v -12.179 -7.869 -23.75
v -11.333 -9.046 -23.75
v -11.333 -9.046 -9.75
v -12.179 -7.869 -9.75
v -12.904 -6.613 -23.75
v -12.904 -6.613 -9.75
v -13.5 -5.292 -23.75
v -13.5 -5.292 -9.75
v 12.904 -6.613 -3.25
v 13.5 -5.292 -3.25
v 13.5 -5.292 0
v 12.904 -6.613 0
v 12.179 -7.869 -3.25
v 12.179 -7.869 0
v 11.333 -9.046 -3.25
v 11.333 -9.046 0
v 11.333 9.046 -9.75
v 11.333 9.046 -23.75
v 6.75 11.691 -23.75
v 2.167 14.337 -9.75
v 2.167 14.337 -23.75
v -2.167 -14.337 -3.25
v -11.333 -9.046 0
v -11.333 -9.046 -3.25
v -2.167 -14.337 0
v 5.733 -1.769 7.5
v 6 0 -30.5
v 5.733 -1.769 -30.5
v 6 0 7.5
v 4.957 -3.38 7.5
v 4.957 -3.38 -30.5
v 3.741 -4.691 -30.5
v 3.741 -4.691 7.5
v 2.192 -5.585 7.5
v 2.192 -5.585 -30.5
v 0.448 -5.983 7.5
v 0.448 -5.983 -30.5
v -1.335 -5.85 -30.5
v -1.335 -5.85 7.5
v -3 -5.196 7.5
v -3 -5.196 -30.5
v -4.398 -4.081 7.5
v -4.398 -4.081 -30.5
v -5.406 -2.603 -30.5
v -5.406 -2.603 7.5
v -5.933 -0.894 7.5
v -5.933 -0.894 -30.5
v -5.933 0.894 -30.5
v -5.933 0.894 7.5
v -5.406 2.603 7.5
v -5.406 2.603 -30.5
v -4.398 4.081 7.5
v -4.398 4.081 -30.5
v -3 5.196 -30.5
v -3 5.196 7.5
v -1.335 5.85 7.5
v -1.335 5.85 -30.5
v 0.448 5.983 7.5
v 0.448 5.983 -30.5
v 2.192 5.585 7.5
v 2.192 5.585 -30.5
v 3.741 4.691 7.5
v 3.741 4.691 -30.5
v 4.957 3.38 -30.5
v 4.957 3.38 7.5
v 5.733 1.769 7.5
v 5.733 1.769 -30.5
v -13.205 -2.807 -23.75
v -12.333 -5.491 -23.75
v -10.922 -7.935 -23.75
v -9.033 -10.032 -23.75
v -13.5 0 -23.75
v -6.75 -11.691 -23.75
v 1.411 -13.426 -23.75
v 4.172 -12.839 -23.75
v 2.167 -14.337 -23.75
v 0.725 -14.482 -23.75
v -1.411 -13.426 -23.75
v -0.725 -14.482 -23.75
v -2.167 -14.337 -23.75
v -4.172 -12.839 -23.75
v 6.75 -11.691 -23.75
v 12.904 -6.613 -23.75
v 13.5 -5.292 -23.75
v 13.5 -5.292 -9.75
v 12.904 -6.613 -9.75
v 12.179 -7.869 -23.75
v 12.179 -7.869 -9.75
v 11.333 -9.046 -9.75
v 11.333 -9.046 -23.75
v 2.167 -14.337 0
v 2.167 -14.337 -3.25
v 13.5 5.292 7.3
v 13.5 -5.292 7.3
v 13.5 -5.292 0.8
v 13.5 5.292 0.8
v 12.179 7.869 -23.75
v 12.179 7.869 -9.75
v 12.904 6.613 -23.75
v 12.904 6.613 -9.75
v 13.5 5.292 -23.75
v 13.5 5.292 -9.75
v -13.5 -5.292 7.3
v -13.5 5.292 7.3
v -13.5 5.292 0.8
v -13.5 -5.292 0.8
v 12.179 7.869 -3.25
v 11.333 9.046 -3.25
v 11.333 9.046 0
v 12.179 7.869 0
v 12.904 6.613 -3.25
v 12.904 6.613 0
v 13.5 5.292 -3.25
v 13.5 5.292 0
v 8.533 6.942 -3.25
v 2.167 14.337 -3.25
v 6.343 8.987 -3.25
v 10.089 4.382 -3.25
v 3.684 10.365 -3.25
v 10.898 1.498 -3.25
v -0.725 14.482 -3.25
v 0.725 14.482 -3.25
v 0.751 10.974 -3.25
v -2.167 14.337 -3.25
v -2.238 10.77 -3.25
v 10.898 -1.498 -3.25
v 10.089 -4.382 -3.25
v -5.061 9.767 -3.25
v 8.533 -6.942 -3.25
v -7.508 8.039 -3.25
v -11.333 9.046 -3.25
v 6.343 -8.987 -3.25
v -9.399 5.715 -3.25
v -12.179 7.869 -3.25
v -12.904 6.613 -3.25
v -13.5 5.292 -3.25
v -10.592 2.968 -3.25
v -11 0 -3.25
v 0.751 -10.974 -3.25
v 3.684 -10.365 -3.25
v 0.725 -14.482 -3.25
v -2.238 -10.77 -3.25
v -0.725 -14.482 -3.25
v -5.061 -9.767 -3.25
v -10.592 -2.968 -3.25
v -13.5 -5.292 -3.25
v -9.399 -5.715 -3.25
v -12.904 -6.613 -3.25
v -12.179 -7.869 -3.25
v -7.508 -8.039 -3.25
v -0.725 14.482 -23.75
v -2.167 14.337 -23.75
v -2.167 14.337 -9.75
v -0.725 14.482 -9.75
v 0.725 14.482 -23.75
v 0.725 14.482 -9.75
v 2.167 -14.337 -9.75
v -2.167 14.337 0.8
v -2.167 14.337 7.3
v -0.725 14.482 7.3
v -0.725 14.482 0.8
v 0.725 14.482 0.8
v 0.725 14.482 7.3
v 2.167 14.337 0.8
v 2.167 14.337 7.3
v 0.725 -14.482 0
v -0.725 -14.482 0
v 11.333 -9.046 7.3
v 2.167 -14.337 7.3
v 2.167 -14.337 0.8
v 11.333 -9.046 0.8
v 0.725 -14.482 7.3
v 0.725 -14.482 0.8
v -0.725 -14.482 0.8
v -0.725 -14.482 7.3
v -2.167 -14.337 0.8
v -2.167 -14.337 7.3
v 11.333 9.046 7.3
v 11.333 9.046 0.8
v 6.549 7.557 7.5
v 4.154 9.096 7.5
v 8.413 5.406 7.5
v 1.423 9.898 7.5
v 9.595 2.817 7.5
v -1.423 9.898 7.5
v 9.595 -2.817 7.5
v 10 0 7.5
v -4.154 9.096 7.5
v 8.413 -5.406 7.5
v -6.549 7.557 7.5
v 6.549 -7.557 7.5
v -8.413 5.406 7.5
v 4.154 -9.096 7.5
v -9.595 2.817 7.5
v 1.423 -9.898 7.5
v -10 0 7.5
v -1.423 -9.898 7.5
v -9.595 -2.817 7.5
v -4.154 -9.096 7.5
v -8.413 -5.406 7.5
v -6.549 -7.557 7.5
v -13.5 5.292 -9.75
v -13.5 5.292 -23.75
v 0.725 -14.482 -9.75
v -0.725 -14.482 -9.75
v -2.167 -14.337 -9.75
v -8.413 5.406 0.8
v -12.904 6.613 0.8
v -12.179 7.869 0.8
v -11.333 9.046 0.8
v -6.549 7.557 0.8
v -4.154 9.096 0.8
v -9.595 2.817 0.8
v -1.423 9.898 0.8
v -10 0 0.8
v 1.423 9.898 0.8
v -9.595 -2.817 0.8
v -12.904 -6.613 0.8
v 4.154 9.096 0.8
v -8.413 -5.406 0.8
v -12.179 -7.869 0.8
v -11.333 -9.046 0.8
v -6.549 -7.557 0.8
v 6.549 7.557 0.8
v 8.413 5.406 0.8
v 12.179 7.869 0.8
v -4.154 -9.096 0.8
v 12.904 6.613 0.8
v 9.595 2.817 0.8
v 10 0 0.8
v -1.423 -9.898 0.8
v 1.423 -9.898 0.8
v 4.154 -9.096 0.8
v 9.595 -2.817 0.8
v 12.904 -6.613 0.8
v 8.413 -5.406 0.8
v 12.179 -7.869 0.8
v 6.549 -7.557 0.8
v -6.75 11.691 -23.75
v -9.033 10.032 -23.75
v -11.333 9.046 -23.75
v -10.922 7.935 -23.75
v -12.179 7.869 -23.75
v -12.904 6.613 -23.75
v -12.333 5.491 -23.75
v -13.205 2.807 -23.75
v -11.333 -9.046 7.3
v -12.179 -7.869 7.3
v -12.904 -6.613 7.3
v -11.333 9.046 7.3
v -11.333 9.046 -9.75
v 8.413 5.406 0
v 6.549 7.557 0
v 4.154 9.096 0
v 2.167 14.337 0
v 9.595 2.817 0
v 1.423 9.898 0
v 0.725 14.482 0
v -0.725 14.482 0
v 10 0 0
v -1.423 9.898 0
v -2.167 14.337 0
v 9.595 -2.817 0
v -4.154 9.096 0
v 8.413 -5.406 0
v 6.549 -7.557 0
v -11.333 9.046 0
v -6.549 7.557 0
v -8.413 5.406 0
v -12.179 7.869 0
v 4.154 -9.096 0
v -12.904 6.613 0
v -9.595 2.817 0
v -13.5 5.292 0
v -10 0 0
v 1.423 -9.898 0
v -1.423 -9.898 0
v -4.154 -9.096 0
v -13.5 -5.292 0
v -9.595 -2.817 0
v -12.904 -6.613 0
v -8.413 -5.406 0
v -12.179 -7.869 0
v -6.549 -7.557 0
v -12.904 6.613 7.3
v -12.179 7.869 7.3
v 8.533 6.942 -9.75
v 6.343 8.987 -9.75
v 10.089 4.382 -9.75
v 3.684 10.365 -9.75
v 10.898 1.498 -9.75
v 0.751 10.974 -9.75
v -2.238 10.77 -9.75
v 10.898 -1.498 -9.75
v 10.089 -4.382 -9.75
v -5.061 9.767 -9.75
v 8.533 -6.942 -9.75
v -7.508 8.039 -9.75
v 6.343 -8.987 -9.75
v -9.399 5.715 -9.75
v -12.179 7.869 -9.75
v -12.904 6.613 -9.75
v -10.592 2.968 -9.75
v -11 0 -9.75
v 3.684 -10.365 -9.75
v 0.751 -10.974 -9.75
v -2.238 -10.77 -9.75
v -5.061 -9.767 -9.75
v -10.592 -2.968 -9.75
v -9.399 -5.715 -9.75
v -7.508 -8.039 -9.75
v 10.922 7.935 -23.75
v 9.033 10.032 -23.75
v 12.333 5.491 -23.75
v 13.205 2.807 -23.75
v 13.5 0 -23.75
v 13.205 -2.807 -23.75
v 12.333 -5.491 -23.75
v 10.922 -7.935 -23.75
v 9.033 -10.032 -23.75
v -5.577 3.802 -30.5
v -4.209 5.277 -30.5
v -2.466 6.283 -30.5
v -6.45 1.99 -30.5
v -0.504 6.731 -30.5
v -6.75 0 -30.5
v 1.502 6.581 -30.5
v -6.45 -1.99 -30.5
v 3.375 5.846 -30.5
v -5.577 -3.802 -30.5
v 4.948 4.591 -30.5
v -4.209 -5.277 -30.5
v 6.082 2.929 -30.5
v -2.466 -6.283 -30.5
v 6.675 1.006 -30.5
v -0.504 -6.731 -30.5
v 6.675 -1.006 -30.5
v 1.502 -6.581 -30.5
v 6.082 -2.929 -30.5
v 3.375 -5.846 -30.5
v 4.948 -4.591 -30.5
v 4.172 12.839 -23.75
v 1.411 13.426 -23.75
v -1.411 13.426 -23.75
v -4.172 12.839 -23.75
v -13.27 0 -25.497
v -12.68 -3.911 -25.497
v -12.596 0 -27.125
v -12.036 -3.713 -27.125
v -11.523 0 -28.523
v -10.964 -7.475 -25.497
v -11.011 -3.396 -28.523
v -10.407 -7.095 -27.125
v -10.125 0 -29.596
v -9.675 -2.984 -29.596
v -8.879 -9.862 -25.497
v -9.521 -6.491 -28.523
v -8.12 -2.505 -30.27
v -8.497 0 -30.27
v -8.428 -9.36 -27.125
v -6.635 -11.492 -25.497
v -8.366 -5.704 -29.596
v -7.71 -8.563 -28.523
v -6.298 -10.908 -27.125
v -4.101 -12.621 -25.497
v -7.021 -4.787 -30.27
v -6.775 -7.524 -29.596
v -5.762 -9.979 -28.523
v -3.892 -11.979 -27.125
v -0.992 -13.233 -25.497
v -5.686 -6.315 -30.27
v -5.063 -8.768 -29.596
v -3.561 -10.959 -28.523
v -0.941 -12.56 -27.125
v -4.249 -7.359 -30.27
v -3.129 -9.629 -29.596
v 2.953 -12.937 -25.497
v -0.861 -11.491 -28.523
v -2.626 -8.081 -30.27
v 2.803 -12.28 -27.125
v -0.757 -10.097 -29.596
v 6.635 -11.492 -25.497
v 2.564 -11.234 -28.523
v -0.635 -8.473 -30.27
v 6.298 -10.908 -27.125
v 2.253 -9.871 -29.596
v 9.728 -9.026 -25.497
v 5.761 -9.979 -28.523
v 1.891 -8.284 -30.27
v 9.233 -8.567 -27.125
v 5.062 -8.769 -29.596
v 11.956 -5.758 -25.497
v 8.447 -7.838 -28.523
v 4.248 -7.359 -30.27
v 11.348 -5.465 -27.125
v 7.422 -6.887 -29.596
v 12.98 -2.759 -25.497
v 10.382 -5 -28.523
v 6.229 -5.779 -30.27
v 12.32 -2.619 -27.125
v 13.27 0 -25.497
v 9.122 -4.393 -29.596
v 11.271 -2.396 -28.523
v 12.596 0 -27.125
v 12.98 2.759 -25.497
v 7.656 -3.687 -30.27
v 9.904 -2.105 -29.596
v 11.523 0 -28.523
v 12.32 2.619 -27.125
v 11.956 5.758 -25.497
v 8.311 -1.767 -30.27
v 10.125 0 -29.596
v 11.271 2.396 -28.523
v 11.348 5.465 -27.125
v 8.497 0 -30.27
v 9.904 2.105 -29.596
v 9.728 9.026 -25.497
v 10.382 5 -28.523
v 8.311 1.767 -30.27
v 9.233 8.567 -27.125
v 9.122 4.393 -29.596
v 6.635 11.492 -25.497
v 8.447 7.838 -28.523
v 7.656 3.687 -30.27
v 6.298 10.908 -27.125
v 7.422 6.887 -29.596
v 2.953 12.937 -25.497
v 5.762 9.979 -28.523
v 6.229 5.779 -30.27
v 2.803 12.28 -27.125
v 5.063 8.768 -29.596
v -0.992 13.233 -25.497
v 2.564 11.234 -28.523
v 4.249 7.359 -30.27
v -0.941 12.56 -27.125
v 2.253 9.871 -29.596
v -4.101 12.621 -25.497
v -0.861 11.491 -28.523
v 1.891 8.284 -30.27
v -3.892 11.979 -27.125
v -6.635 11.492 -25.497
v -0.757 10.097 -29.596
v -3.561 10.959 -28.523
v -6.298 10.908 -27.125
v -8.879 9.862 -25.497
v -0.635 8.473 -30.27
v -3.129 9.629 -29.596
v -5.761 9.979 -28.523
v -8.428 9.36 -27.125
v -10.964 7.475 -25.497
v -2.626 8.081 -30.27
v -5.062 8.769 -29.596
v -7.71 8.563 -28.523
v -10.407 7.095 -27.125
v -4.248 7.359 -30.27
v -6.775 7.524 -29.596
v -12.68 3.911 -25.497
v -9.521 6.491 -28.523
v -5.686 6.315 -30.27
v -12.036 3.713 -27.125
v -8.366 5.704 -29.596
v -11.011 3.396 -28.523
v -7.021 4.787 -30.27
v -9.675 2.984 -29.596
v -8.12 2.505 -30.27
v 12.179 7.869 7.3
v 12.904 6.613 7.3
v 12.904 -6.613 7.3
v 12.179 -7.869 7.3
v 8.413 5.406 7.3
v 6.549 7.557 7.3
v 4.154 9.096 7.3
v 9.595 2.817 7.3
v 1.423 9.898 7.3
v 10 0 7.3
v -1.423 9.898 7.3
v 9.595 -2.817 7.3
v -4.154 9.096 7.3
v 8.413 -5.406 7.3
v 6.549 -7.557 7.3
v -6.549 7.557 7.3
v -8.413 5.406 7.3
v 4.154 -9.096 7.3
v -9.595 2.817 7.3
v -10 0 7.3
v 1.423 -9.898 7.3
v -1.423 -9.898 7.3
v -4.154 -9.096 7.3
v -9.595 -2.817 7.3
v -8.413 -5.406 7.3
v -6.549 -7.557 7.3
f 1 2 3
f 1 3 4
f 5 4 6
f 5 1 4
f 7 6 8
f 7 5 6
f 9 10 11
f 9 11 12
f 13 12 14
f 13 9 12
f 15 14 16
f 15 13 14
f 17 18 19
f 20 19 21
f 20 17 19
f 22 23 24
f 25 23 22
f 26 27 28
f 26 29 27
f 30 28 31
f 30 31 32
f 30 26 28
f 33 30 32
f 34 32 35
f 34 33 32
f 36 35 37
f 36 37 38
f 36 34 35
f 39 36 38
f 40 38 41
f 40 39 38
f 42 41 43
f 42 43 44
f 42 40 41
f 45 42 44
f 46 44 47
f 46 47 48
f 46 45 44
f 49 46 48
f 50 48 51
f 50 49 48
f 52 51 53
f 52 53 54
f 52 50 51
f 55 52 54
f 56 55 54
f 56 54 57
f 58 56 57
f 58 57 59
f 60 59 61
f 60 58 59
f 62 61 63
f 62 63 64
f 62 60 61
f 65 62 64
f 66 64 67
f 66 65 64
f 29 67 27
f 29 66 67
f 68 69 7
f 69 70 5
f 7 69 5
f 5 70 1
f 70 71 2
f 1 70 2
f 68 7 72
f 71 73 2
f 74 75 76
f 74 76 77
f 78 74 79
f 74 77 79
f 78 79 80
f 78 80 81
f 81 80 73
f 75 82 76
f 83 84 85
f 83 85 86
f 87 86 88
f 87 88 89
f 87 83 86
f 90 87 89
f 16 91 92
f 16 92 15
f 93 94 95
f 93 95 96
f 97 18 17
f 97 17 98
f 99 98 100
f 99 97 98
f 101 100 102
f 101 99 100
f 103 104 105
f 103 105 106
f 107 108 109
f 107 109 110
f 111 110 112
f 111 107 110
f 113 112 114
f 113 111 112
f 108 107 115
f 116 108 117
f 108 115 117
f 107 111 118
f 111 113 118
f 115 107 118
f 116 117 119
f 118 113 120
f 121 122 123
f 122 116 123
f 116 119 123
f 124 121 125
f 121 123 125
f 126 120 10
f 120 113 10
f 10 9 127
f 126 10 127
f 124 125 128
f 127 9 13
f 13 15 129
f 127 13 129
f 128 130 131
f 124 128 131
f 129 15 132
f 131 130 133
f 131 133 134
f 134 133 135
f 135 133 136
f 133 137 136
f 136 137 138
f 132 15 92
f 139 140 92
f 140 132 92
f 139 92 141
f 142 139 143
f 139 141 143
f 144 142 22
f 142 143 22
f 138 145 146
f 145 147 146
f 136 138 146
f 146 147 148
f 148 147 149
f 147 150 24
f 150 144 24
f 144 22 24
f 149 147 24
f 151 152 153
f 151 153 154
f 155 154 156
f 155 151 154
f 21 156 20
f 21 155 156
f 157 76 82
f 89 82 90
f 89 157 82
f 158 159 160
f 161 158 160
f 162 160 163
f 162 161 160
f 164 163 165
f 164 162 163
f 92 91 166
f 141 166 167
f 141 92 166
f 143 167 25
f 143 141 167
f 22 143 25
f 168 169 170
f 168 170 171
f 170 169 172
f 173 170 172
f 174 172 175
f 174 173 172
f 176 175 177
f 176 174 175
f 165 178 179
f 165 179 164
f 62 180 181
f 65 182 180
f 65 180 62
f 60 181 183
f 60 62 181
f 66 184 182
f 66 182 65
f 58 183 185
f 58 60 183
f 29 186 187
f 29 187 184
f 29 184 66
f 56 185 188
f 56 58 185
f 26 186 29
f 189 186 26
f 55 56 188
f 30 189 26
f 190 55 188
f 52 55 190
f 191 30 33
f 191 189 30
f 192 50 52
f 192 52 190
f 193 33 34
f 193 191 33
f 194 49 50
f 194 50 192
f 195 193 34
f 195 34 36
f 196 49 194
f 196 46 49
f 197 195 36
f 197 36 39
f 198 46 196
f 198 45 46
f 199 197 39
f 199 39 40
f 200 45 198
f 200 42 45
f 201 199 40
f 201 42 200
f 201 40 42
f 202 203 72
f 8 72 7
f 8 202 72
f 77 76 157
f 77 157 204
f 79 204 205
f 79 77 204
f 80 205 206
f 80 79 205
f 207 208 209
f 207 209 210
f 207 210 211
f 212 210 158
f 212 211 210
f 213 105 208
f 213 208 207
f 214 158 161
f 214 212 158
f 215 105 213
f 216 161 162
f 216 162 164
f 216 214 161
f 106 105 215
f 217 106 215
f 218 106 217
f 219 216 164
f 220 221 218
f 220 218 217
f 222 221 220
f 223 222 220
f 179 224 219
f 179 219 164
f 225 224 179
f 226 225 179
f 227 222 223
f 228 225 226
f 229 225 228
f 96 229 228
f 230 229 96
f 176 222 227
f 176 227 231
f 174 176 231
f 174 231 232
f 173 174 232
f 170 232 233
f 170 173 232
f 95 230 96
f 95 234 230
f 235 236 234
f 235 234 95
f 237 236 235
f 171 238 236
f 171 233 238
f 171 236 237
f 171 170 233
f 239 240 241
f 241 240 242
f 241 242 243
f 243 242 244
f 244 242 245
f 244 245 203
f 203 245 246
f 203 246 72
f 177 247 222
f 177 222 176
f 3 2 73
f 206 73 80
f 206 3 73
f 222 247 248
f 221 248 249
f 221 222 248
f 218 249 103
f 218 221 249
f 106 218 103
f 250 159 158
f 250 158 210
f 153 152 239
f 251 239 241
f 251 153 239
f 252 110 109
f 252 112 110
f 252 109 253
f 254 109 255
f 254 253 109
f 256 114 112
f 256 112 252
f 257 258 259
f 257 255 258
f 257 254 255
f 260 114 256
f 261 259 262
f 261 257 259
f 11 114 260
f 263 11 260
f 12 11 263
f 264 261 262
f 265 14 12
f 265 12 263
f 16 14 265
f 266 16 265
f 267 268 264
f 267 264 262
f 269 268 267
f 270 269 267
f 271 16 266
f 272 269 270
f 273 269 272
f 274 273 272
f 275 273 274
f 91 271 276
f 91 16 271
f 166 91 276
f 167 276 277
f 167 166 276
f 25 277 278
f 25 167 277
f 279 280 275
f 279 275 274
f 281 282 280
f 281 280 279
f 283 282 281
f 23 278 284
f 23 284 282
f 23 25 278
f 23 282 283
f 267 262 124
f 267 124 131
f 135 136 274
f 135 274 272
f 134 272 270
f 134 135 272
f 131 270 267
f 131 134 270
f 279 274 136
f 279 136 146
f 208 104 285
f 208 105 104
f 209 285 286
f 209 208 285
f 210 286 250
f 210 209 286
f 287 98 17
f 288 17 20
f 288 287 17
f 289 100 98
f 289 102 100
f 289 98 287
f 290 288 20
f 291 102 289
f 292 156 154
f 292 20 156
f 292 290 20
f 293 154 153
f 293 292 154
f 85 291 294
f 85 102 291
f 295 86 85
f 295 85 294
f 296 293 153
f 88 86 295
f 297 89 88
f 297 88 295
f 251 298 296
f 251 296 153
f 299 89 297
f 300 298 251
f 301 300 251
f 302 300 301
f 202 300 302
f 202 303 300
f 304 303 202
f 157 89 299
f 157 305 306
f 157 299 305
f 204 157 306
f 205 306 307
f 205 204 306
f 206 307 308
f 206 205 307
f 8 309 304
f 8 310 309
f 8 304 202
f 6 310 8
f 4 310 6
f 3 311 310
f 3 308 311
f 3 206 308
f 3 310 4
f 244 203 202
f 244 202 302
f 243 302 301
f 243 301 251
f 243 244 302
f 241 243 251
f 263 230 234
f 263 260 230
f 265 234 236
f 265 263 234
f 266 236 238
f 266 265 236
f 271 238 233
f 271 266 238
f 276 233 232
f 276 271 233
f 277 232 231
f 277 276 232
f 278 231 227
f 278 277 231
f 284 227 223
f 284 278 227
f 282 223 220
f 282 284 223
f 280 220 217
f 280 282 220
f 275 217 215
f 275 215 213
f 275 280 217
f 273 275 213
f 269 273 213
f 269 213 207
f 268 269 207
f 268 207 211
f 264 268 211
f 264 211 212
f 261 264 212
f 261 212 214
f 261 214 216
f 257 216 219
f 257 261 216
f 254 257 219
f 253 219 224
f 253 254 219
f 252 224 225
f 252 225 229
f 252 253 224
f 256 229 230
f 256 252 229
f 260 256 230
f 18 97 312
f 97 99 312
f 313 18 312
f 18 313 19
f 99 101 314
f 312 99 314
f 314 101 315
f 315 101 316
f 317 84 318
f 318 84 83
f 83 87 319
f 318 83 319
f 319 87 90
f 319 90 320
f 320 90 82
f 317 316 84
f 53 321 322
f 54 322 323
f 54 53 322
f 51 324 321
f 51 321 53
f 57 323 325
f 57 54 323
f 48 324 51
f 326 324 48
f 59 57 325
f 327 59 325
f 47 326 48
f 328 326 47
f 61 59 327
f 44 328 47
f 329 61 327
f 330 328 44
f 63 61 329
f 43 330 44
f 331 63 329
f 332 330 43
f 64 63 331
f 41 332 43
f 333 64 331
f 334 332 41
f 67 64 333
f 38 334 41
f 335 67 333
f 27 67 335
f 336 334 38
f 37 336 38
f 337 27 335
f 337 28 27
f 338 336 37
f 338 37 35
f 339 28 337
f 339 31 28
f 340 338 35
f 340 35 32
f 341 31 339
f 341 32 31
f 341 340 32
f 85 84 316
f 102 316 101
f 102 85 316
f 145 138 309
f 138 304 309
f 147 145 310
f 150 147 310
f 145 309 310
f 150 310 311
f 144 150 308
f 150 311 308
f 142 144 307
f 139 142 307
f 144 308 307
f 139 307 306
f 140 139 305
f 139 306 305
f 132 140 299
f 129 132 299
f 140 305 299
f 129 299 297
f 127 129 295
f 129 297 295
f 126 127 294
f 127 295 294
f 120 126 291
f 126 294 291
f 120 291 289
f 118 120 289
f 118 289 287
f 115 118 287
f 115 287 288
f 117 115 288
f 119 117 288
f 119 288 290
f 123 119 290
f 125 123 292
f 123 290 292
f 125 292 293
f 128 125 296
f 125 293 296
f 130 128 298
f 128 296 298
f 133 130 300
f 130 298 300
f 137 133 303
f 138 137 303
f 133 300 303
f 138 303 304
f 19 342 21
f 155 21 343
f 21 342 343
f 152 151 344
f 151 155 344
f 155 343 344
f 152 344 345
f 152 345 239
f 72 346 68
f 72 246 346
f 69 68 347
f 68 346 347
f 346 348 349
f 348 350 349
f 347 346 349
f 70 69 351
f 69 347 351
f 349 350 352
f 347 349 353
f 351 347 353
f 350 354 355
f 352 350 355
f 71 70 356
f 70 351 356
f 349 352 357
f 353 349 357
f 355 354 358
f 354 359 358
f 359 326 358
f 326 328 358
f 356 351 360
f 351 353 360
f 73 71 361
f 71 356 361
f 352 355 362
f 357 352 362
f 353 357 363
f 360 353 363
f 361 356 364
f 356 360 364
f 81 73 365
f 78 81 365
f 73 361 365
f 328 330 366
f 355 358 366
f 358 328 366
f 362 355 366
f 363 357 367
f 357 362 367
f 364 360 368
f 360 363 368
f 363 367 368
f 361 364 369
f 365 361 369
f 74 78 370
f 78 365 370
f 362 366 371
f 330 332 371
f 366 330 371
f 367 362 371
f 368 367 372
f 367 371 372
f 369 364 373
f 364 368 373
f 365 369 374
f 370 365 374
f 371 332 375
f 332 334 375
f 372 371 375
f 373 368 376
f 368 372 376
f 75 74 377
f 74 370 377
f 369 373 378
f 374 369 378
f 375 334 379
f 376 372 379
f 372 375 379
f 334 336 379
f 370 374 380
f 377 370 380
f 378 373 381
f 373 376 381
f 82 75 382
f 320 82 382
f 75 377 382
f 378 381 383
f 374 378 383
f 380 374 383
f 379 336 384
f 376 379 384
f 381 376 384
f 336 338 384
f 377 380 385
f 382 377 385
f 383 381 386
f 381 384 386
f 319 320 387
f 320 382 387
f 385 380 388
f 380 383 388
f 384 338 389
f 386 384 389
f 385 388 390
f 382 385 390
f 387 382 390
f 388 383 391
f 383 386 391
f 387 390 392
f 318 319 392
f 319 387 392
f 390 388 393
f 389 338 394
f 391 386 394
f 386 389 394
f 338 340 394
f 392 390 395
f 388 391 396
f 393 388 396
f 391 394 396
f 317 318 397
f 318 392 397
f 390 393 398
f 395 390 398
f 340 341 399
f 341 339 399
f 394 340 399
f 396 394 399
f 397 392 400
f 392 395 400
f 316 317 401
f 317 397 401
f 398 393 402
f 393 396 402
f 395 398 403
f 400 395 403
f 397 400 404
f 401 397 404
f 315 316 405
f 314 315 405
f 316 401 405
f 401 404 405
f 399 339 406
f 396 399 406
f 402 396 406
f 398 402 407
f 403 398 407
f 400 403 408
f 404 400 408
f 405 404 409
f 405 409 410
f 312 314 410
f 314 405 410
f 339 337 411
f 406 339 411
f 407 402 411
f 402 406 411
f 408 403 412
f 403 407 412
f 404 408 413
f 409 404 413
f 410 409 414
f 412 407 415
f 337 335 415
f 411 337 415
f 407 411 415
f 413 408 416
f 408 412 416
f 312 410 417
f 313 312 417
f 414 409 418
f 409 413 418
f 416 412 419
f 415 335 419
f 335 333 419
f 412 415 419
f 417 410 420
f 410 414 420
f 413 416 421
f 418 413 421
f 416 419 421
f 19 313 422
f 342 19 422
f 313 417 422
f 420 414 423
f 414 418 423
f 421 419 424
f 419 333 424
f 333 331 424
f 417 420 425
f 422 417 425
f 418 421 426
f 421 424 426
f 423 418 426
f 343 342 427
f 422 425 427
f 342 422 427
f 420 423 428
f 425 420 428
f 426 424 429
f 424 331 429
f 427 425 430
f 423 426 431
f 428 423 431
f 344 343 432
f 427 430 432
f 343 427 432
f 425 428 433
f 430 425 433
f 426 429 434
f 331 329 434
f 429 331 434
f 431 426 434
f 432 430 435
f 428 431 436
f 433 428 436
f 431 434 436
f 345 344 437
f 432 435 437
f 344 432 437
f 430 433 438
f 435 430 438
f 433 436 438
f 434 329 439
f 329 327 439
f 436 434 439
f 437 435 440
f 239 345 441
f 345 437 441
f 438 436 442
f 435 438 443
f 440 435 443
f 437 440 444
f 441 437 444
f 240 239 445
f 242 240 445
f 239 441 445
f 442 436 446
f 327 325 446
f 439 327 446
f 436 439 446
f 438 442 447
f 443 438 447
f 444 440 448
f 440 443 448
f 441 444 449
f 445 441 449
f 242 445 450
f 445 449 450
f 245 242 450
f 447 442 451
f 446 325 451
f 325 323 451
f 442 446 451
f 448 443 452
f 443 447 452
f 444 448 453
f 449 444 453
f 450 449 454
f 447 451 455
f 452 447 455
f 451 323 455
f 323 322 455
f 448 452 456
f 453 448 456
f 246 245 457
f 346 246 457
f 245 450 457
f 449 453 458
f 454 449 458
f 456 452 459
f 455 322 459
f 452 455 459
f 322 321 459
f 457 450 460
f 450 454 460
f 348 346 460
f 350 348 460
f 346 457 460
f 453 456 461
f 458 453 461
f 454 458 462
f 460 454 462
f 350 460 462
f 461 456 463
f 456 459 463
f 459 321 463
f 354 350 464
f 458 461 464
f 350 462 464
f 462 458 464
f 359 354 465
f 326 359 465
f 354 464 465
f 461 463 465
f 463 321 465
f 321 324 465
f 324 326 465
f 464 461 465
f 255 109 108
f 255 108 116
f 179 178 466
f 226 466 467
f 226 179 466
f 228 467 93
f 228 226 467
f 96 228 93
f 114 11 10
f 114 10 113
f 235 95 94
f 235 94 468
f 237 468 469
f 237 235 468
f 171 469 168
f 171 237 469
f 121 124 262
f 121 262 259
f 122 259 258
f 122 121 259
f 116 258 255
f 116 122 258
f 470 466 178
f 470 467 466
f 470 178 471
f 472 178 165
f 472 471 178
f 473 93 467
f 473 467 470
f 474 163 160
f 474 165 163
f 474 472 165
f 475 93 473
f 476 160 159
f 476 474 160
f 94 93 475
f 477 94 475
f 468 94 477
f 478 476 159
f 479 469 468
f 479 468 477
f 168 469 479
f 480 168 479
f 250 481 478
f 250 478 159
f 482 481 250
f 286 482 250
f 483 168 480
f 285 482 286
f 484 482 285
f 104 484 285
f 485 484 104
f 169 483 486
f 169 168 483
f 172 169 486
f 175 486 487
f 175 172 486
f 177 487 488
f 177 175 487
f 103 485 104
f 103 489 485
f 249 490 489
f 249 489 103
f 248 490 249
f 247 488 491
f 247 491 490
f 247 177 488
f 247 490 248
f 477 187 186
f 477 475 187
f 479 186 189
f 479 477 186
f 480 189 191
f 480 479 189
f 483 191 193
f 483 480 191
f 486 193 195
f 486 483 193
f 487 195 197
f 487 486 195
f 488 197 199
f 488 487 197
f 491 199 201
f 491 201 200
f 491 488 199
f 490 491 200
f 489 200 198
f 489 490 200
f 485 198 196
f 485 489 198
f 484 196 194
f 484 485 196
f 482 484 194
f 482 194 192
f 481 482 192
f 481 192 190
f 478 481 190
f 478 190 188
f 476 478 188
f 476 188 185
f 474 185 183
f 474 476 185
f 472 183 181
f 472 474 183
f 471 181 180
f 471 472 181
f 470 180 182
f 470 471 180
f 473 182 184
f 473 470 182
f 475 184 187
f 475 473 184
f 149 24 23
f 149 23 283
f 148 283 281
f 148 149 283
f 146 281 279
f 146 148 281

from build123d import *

# Parameters (mm, degrees)
SKETCH2_OUTSIDE_W  = 42.182
SKETCH2_OUTSIDE_H  = 42.182
CUT_EXTRUDE1_DEPTH = 44.003953307
SKETCH3_W          = 5
SKETCH3_H          = 6.5


with BuildPart() as part:
    # Sketch1 → Revolve1 (revolve)
    with BuildSketch(Plane(origin=(0, 0, 0), x_dir=(0, 0, -1), z_dir=(1, 0, 0)), mode=Mode.PRIVATE) as revolve1_sk:
        Polygon((-7.5, 10), (-7.3, 10), (-7.3, 14.5), (-0.8, 14.5), (-0.8, 10), (0, 10), (0, 14.5), (30.5, 14.5), (30.5, 6), (-7.5, 6), align=None)
    revolve(revolve1_sk.sketch.rotate(Axis((0, 0, 7.5), (0, 0, -1)), 90), axis=Axis((0, 0, 7.5), (0, 0, -1)))

    # Sketch2 outside → Cut-Extrude1 (cut, through all)
    with BuildSketch(Plane.XY.offset(7.3)):
        Rectangle(SKETCH2_OUTSIDE_W, SKETCH2_OUTSIDE_H)
        Polygon((0, 15.588457268), (-13.5, 7.794228634), (-13.5, -7.794228634), (0, -15.588457268), (13.5, -7.794228634), (13.5, 7.794228634), align=None, mode=Mode.SUBTRACT)
    extrude(amount=-CUT_EXTRUDE1_DEPTH, mode=Mode.SUBTRACT)

    # Sketch3 → Cut-Revolve3 (revolve, cut)
    with BuildSketch(Plane(origin=(0, 0, 0), x_dir=(1, 0, 0), z_dir=(0, 1, 0))):
        with BuildLine():
            Line((-6.75, 30.5), (-6.75, 35.5))
            Line((-6.75, 35.5), (-61.446878064, 35.5))
            Line((-61.446878064, 35.5), (-61.446878064, 23.75))
            Line((-61.446878064, 23.75), (-13.5, 23.75))
            ThreePointArc((-13.5, 23.75), (-11.522970773, 28.522970773), (-6.75, 30.5))
        make_face()
        with Locations((-13.5, 6.5)):
            Rectangle(SKETCH3_W, SKETCH3_H)
    revolve(axis=Axis((0, 0, -30.5), (0, 0, 1)), mode=Mode.SUBTRACT)


solid = part.part
